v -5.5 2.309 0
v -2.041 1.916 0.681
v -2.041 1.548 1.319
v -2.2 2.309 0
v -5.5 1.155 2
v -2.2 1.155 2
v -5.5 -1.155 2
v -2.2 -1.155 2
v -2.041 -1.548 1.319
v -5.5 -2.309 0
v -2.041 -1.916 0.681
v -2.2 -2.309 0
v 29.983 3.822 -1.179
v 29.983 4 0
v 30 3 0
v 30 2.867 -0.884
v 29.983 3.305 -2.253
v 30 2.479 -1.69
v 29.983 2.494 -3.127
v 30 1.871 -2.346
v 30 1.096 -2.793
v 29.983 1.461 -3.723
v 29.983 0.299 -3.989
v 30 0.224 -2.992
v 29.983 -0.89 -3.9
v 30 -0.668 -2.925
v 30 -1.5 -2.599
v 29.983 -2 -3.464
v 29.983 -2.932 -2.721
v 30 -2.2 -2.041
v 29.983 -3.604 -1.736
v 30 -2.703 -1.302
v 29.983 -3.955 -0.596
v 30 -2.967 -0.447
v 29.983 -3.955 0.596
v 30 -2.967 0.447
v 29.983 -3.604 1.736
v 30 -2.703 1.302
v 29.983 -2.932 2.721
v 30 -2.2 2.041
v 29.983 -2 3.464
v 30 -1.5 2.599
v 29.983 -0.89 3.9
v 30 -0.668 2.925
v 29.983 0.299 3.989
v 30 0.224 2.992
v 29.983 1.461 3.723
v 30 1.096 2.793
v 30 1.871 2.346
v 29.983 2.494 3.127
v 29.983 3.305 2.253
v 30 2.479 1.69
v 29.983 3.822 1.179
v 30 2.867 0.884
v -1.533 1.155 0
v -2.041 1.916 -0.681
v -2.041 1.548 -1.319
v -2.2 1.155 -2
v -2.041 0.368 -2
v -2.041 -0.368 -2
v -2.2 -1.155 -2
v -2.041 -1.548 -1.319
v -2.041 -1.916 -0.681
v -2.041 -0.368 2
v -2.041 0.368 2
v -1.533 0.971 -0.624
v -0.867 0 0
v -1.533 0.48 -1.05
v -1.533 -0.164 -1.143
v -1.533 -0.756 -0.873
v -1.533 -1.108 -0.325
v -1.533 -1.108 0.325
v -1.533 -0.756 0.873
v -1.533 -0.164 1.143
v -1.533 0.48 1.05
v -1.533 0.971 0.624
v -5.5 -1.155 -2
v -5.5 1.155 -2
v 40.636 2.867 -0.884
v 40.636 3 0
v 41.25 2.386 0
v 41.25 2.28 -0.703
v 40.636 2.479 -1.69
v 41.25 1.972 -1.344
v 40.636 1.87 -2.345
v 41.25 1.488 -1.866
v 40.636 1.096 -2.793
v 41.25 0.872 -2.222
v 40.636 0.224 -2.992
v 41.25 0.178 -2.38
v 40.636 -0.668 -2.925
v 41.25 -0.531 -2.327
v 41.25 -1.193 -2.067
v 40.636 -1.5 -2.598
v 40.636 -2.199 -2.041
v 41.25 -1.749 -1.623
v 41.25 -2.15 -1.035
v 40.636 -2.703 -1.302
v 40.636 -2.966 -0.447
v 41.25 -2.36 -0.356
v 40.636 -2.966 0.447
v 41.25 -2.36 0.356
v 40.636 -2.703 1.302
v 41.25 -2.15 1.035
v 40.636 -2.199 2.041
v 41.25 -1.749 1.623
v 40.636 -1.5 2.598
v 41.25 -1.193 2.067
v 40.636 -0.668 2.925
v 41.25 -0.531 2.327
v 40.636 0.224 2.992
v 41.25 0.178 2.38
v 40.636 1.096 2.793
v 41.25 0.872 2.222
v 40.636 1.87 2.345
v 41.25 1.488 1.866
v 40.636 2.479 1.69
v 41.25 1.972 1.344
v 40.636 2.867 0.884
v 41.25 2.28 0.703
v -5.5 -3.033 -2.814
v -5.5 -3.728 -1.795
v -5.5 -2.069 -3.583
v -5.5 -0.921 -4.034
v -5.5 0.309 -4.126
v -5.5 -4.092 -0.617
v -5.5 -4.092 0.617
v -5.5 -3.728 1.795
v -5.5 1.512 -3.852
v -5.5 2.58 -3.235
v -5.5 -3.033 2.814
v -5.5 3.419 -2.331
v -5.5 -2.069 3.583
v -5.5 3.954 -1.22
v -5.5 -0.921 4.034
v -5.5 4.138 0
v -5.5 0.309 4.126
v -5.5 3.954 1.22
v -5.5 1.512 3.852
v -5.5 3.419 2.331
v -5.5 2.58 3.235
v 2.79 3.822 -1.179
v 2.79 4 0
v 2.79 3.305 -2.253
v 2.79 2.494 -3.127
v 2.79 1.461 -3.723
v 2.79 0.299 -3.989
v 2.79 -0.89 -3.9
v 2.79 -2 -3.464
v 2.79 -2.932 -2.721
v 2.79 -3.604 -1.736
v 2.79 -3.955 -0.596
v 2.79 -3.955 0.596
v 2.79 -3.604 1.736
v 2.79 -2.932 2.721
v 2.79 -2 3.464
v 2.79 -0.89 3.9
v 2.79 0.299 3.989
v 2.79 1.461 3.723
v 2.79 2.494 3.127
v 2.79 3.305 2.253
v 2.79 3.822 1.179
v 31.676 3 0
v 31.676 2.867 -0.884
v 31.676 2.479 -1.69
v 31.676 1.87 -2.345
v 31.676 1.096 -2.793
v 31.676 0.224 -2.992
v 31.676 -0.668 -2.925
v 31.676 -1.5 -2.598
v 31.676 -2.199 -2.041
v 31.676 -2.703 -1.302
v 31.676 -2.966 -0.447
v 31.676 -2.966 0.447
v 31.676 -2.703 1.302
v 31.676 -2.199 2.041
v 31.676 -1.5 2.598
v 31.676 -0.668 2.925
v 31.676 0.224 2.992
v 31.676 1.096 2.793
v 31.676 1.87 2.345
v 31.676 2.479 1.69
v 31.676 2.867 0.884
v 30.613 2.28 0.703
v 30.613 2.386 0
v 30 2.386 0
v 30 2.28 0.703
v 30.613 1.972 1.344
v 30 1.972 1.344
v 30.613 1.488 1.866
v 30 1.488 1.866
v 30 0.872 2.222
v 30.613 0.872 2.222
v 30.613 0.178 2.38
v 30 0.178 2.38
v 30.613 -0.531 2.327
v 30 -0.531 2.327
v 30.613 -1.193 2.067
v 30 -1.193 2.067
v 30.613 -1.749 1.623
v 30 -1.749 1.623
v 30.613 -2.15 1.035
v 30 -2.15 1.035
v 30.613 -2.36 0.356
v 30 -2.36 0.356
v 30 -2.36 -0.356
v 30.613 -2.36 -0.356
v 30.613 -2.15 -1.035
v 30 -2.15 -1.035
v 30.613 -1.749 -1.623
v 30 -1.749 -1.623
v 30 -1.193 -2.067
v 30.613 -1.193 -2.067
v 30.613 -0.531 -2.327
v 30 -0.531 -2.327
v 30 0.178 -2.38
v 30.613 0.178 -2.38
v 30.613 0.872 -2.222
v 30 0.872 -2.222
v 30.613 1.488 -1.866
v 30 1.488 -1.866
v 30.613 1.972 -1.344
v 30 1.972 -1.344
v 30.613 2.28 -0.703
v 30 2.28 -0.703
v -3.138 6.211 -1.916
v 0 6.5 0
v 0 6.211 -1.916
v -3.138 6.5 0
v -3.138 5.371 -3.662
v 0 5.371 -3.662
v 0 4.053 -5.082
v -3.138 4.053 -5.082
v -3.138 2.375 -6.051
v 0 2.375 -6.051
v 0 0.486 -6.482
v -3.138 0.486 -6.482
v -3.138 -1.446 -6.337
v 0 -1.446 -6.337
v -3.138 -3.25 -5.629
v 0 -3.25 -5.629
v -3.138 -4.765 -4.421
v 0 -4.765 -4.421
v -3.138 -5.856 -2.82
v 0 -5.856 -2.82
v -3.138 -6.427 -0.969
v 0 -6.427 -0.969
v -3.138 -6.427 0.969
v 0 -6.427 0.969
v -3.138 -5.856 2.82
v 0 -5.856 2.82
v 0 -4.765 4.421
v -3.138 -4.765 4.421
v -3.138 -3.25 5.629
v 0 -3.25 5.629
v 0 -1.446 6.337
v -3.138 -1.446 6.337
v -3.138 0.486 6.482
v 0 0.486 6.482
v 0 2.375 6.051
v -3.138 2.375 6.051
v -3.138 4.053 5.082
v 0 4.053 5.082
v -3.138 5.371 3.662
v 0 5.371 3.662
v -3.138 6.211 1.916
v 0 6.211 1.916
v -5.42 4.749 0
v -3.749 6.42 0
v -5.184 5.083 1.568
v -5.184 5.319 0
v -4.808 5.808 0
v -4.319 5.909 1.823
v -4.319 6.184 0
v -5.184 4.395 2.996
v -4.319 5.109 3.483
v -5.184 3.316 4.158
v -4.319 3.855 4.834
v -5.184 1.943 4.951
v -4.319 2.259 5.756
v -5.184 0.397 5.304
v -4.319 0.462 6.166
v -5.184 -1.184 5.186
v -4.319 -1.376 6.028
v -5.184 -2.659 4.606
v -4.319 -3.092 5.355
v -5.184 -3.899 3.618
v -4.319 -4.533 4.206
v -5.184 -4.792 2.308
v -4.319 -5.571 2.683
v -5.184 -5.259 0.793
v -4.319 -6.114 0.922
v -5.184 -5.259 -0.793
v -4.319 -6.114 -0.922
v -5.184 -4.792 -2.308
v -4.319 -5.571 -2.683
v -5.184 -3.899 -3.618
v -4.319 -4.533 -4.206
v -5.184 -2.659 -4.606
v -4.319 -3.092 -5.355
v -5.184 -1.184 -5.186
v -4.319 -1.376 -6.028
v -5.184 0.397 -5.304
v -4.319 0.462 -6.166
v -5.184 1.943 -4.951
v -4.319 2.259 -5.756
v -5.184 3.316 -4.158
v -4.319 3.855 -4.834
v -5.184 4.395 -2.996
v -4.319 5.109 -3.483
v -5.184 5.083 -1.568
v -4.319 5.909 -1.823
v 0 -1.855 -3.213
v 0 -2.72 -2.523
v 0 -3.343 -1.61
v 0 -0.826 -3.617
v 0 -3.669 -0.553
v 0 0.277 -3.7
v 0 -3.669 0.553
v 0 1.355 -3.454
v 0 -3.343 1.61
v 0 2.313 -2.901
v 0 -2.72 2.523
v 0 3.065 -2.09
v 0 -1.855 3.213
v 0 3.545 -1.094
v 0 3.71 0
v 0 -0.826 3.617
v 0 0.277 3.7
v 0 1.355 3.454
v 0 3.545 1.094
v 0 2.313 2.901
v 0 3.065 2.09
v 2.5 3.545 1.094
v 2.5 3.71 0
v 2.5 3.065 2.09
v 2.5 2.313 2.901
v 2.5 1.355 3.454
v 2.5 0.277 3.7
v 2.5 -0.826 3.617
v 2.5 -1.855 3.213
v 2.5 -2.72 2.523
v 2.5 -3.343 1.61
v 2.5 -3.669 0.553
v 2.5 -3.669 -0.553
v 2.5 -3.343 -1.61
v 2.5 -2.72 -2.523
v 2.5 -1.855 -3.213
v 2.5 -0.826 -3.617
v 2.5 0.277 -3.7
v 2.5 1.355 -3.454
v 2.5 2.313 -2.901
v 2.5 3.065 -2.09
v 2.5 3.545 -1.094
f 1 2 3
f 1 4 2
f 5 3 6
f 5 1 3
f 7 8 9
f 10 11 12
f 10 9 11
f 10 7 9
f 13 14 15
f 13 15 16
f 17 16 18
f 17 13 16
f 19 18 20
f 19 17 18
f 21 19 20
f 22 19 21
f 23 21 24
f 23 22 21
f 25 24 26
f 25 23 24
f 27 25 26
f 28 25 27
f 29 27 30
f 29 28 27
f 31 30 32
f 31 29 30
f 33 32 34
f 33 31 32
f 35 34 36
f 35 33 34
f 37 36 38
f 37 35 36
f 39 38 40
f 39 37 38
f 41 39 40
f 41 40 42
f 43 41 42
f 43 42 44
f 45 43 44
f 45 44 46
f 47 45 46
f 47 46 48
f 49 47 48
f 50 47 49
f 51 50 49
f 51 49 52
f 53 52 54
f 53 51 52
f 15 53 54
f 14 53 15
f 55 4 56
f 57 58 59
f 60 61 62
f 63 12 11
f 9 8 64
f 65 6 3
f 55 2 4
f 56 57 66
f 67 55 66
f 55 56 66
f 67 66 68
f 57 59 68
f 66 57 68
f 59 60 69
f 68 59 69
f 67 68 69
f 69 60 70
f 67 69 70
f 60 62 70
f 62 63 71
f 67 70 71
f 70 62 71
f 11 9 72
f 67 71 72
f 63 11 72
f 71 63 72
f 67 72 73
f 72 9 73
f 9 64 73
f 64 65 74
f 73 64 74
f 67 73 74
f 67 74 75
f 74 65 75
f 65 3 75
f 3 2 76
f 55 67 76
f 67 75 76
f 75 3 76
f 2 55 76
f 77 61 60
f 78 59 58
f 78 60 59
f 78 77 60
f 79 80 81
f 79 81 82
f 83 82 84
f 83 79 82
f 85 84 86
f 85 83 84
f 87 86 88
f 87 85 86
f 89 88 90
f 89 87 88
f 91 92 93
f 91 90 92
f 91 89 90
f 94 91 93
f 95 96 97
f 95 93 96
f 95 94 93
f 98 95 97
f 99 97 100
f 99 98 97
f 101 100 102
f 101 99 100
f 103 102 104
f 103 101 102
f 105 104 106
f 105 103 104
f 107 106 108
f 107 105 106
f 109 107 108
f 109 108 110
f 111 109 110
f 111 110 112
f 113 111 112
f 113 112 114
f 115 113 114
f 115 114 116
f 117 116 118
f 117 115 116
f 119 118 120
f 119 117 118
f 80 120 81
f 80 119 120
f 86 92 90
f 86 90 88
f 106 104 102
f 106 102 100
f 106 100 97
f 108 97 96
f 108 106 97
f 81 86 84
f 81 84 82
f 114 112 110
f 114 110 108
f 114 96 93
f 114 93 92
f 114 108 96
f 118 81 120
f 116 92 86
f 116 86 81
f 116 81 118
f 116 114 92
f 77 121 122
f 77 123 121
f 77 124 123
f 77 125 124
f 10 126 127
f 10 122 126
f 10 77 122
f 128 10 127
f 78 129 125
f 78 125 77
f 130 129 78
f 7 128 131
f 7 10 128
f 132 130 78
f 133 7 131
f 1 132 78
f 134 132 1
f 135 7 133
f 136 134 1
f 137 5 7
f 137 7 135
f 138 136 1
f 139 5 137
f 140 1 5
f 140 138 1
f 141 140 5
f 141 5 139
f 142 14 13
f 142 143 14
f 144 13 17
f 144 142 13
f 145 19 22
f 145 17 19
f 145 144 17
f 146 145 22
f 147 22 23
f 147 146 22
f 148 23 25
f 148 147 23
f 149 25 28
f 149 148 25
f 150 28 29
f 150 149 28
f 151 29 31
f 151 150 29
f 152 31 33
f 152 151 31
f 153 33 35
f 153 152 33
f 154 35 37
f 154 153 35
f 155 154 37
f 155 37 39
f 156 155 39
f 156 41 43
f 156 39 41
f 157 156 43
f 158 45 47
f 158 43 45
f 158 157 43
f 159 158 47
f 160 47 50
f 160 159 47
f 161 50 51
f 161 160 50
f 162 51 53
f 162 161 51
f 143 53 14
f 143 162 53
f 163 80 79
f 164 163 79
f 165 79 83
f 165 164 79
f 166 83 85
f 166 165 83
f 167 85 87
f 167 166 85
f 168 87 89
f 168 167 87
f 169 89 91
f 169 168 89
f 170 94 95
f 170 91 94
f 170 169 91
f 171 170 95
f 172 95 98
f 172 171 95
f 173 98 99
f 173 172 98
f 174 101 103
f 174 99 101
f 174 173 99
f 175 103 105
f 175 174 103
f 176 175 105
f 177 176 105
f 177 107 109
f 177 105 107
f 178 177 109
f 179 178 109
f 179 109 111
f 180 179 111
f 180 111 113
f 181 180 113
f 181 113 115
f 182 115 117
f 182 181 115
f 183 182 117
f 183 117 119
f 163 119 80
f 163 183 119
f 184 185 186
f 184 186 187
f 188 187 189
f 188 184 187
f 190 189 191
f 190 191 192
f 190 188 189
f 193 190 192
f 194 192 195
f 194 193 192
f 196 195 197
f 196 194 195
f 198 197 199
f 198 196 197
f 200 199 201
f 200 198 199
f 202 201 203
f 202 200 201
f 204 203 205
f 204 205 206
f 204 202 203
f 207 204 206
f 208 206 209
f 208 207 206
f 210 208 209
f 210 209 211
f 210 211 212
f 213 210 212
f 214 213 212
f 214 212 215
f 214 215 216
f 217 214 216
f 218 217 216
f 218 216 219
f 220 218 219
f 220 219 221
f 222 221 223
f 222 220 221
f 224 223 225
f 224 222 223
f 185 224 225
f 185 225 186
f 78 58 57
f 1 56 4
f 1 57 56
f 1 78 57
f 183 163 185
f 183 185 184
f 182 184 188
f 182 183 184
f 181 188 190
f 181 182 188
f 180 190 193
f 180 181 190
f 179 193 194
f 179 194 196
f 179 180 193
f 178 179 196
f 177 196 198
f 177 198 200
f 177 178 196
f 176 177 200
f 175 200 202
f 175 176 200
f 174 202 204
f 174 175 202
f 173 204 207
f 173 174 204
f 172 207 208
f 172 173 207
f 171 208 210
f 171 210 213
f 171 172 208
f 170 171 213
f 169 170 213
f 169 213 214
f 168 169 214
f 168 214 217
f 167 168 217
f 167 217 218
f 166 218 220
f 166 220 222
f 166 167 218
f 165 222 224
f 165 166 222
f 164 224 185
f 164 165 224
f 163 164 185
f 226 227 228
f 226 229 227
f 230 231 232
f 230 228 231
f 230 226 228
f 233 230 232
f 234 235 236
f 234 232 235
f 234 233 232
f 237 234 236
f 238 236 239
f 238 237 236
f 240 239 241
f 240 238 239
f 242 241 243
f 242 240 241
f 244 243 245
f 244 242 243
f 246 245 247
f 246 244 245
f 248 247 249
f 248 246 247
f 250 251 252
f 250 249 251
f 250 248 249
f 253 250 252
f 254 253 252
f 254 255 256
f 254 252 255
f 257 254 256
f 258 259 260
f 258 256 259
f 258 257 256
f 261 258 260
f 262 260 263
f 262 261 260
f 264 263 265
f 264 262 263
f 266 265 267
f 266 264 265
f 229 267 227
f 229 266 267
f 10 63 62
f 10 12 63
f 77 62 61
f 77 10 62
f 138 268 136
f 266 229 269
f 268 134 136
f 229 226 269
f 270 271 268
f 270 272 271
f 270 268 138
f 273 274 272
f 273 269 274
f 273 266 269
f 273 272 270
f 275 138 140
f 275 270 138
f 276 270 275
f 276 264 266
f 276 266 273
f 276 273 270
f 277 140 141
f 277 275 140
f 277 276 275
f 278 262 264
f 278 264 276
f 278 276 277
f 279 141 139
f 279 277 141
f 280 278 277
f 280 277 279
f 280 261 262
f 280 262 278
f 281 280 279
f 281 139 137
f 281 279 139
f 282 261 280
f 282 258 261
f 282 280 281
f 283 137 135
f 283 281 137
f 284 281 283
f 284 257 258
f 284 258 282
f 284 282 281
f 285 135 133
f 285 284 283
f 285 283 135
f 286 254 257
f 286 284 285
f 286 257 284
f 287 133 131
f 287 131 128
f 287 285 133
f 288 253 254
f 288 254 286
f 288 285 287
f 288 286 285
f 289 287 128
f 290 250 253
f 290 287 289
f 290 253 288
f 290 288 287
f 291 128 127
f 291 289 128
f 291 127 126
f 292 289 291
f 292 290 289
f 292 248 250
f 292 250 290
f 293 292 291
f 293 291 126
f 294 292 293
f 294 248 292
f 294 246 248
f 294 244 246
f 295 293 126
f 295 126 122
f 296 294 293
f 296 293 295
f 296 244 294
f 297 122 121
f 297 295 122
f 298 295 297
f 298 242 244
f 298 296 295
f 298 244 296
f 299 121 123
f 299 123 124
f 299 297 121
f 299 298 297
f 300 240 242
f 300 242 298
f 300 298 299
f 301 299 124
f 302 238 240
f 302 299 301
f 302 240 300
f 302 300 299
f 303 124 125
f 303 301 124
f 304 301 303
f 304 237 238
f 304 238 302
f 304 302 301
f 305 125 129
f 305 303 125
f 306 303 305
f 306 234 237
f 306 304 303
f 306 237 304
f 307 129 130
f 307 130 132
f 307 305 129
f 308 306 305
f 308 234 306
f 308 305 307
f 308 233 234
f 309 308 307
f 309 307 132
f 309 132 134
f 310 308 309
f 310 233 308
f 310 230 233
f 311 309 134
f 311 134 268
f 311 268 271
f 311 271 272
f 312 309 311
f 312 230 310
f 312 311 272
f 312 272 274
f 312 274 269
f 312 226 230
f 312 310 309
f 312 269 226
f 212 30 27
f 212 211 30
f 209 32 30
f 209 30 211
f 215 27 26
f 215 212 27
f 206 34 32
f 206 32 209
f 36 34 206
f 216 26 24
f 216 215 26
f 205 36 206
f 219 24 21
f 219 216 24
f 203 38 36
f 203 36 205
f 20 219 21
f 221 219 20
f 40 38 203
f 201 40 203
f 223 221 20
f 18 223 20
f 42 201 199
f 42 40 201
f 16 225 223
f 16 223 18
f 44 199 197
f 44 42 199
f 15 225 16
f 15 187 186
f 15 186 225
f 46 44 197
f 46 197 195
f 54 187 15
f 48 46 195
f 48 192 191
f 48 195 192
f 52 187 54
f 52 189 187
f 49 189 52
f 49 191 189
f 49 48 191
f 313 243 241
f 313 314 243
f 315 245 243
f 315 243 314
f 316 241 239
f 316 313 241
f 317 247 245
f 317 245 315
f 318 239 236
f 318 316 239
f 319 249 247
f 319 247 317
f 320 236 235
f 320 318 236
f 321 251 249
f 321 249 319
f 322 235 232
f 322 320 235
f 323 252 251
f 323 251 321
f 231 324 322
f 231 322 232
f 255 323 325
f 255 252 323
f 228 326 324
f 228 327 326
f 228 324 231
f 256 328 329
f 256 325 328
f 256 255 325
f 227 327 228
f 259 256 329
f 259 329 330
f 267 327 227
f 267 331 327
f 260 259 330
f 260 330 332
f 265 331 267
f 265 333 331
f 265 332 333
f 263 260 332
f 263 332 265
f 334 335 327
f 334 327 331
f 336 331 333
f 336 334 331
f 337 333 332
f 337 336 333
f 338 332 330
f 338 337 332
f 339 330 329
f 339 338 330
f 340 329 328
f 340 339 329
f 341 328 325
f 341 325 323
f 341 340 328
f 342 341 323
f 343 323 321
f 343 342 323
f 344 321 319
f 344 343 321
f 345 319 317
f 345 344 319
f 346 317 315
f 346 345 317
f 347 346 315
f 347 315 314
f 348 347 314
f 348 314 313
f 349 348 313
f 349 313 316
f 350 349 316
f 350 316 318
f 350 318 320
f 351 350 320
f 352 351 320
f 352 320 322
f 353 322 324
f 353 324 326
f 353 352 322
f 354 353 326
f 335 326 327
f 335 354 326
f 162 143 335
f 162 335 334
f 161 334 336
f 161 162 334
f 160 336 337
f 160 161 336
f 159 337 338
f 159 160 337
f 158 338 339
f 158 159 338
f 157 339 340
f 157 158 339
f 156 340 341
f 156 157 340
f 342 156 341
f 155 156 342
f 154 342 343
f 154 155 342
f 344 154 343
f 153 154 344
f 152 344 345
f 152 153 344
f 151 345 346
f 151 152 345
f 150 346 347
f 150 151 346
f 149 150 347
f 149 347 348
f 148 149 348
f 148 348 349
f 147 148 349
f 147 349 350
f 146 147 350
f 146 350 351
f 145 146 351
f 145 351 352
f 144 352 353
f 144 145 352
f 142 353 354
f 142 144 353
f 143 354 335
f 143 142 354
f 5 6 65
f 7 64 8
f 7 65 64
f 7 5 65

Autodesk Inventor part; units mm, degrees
ref_plane "YZ Plane" through (0, 0, 0) normal (1, 0, 0) x (0, 1, 0)
ref_plane "XZ Plane" through (0, 0, 0) normal (0, 1, 0) x (-1, 0, 0)
sketch "Sketch1" plane through (0, 0, 0) normal (0, 0, 1) x (1, 0, 0)
  line L0 (-0.8667, 0) -> (41.25, 0)
  line L1 (41.25, 0) -> (41.25, 3)
  line L2 (41.25, 3) -> (30, 3)
  line L3 (30, 3) -> (30, 4)
  line L4 (30, 4) -> (0, 4)
  line L5 (0, 4) -> (0, 6.5)
  line L6 (0, 6.5) -> (-5.5, 6.5)
  line L7 (-5.5, 6.5) -> (-5.5, 2.3094)
  line L8 (-5.5, 2.3094) -> (-2.2, 2.3094)
  line L9 (-2.2, 2.3094) -> (-0.8667, 0)
  line L10 (-10.175, 0) -> (55.275, 0) projected
  line L11 (0, -0.65) -> (0, 8.45) projected
  line L12 (0, 3.71) -> (2.5, 3.71)
  line L13 (2.5, 3.71) -> (2.79, 4)
  line L14 (30, 3) -> (30, 2.3865)
  line L15 (30, 2.3865) -> (30.6134, 2.3865)
  line L16 (30.6134, 2.3865) -> (31.676, 3)
  line L17 (0, 3.71) -> (0, 4)
  dimension "d0" = 6
  dimension "d1" = 8
  dimension "d2" = 13
  dimension "d3" = 4.6188
  dimension "d5" = 11.25
  dimension "d6" = 5.5
  dimension "d7" = 3.3
  dimension "d8" = 60
  dimension "d9" = 41.25
  dimension "d18" = 2.5
  dimension "d19" = 45
  dimension "d20" = 7.42
  dimension "d21" = 4.7731
  dimension "d22" = 30
  dimension "d23" = 0.6135
revolve "Body" add sketch "Sketch1" angle 360 about axis through (-0.8667, 0, 0) along (1, 0, 0)
sketch "Sketch2" plane through (-5.5, 0, 0) normal (-1, 0, 0) x (0, 0, 1)
  circle A0 centre (0, 0) radius 2.3094 projected
  line L0 (0, 2.3094) -> (2, 1.1547)
  line L1 (2, 1.1547) -> (2, -1.1547)
  line L2 (2, -1.1547) -> (0, -2.3094)
  line L3 (0, -2.3094) -> (-2, -1.1547)
  line L4 (-2, -1.1547) -> (-2, 1.1547)
  line L5 (-2, 1.1547) -> (0, 2.3094)
  point P0 (0, 0)
extrude "Slot" add sketch "Sketch2" against normal up to next contours A0 L1 | L0 A0 | A0 L2 | L5 A0 | A0 L3 | L4 A0
fillet "Fillet1" radius 2.3622 1 edges at (-5.5, -6.5, 0)
thread "Thread" size "M6x1" class "6g" standard "ISO Metric profile" length 11.25
chamfer "Chamfer1" distance 0.6135 distance2 0.6135 1 edges at (41.25, -3, 0) measured on face at (41.25, 1, 0)
chamfer "Chamfer2" distance 1 angle 1 1 edges at (30, -4, 0) measured on face at (30, 3.5989, -0.5584)
revolve "Groove1" cut sketch "Sketch1" angle 360 about axis through (-0.8667, 0, 0) along (1, 0, 0) contours L11 L4 L13 L12
revolve "Groove2" cut sketch "Sketch1" angle 360 about axis through (-0.8667, 0, 0) along (1, 0, 0) contours L16 L15 L14 L2
ref_plane "Work Plane1" through (15, 0, 0) normal (0, 0, 1) x (1, 0, 0)
equation "\"d0\" = NND"
equation "\"d1\" = BDM"
equation "\"d2\" = KOD"
equation "\"d3\" = 1.1547 * SW"
equation "\"d5\" = GEL"
equation "\"d6\" = KOH"
equation "\"d7\" = INTI + LOTI"
equation "\"d8\" = 0.5 * ANG"
equation "\"d9\" = NLG"
equation "\"d18\" = GAL2"
equation "\"d19\" = FAWI4"
equation "\"d20\" = BDMM"
equation "\"d21\" = GD1"
equation "\"d22\" = FAWI2"
equation "\"d23\" = GAL"
equation "\"d13\" = RR"
equation "\"d25\" = GEL"
equation "\"d14\" = -0.5 * SPD + 0.5 * NND"
equation "\"d15\" = GUL"
equation "\"d16\" = -0.5 * NND + 0.5 * BDM"
equation "\"d32\" = -0.5 * NND + 0.5 * BDM"
equation "\"NND\" = 6"
equation "\"NLG\" = 41.25"
equation "\"GEL\" = 11.25"
equation "\"KOD\" = 13"
equation "\"KOH\" = 5.5"
equation "\"INTI\" = 3.3"
equation "\"GAL\" = 0.61345 * PTC"
equation "\"GUL\" = 0.61345 * PTC"
equation "\"SPD\" = NND - 1.2269 * PTC"
equation "\"BDM\" = 8"
equation "\"ANG\" = 120deg"
equation "\"FAWI2\" = 30deg"
equation "\"FAWI3\" = 89deg"
equation "\"FAWI4\" = 45deg"
equation "\"RR\" = 2.3622"
equation "\"SW\" = 4"
equation "\"BDMM\" = 7.42"
equation "\"GAL2\" = 2.5"
equation "\"LOTI\" = 0"
equation "\"GD1\" = THREADDIA - 1.2269 * PTC"
equation "\"PTC\" = 1"
equation "\"BOR\" = 4"
equation "\"THREADDIA\" = 6"
equation "\"E0\" = 1.155 * SW"
equation "\"TOA\" = 30deg"
equation "\"PHH\" = 0.55"
properties part number "100005" material "Steel, Mild"
